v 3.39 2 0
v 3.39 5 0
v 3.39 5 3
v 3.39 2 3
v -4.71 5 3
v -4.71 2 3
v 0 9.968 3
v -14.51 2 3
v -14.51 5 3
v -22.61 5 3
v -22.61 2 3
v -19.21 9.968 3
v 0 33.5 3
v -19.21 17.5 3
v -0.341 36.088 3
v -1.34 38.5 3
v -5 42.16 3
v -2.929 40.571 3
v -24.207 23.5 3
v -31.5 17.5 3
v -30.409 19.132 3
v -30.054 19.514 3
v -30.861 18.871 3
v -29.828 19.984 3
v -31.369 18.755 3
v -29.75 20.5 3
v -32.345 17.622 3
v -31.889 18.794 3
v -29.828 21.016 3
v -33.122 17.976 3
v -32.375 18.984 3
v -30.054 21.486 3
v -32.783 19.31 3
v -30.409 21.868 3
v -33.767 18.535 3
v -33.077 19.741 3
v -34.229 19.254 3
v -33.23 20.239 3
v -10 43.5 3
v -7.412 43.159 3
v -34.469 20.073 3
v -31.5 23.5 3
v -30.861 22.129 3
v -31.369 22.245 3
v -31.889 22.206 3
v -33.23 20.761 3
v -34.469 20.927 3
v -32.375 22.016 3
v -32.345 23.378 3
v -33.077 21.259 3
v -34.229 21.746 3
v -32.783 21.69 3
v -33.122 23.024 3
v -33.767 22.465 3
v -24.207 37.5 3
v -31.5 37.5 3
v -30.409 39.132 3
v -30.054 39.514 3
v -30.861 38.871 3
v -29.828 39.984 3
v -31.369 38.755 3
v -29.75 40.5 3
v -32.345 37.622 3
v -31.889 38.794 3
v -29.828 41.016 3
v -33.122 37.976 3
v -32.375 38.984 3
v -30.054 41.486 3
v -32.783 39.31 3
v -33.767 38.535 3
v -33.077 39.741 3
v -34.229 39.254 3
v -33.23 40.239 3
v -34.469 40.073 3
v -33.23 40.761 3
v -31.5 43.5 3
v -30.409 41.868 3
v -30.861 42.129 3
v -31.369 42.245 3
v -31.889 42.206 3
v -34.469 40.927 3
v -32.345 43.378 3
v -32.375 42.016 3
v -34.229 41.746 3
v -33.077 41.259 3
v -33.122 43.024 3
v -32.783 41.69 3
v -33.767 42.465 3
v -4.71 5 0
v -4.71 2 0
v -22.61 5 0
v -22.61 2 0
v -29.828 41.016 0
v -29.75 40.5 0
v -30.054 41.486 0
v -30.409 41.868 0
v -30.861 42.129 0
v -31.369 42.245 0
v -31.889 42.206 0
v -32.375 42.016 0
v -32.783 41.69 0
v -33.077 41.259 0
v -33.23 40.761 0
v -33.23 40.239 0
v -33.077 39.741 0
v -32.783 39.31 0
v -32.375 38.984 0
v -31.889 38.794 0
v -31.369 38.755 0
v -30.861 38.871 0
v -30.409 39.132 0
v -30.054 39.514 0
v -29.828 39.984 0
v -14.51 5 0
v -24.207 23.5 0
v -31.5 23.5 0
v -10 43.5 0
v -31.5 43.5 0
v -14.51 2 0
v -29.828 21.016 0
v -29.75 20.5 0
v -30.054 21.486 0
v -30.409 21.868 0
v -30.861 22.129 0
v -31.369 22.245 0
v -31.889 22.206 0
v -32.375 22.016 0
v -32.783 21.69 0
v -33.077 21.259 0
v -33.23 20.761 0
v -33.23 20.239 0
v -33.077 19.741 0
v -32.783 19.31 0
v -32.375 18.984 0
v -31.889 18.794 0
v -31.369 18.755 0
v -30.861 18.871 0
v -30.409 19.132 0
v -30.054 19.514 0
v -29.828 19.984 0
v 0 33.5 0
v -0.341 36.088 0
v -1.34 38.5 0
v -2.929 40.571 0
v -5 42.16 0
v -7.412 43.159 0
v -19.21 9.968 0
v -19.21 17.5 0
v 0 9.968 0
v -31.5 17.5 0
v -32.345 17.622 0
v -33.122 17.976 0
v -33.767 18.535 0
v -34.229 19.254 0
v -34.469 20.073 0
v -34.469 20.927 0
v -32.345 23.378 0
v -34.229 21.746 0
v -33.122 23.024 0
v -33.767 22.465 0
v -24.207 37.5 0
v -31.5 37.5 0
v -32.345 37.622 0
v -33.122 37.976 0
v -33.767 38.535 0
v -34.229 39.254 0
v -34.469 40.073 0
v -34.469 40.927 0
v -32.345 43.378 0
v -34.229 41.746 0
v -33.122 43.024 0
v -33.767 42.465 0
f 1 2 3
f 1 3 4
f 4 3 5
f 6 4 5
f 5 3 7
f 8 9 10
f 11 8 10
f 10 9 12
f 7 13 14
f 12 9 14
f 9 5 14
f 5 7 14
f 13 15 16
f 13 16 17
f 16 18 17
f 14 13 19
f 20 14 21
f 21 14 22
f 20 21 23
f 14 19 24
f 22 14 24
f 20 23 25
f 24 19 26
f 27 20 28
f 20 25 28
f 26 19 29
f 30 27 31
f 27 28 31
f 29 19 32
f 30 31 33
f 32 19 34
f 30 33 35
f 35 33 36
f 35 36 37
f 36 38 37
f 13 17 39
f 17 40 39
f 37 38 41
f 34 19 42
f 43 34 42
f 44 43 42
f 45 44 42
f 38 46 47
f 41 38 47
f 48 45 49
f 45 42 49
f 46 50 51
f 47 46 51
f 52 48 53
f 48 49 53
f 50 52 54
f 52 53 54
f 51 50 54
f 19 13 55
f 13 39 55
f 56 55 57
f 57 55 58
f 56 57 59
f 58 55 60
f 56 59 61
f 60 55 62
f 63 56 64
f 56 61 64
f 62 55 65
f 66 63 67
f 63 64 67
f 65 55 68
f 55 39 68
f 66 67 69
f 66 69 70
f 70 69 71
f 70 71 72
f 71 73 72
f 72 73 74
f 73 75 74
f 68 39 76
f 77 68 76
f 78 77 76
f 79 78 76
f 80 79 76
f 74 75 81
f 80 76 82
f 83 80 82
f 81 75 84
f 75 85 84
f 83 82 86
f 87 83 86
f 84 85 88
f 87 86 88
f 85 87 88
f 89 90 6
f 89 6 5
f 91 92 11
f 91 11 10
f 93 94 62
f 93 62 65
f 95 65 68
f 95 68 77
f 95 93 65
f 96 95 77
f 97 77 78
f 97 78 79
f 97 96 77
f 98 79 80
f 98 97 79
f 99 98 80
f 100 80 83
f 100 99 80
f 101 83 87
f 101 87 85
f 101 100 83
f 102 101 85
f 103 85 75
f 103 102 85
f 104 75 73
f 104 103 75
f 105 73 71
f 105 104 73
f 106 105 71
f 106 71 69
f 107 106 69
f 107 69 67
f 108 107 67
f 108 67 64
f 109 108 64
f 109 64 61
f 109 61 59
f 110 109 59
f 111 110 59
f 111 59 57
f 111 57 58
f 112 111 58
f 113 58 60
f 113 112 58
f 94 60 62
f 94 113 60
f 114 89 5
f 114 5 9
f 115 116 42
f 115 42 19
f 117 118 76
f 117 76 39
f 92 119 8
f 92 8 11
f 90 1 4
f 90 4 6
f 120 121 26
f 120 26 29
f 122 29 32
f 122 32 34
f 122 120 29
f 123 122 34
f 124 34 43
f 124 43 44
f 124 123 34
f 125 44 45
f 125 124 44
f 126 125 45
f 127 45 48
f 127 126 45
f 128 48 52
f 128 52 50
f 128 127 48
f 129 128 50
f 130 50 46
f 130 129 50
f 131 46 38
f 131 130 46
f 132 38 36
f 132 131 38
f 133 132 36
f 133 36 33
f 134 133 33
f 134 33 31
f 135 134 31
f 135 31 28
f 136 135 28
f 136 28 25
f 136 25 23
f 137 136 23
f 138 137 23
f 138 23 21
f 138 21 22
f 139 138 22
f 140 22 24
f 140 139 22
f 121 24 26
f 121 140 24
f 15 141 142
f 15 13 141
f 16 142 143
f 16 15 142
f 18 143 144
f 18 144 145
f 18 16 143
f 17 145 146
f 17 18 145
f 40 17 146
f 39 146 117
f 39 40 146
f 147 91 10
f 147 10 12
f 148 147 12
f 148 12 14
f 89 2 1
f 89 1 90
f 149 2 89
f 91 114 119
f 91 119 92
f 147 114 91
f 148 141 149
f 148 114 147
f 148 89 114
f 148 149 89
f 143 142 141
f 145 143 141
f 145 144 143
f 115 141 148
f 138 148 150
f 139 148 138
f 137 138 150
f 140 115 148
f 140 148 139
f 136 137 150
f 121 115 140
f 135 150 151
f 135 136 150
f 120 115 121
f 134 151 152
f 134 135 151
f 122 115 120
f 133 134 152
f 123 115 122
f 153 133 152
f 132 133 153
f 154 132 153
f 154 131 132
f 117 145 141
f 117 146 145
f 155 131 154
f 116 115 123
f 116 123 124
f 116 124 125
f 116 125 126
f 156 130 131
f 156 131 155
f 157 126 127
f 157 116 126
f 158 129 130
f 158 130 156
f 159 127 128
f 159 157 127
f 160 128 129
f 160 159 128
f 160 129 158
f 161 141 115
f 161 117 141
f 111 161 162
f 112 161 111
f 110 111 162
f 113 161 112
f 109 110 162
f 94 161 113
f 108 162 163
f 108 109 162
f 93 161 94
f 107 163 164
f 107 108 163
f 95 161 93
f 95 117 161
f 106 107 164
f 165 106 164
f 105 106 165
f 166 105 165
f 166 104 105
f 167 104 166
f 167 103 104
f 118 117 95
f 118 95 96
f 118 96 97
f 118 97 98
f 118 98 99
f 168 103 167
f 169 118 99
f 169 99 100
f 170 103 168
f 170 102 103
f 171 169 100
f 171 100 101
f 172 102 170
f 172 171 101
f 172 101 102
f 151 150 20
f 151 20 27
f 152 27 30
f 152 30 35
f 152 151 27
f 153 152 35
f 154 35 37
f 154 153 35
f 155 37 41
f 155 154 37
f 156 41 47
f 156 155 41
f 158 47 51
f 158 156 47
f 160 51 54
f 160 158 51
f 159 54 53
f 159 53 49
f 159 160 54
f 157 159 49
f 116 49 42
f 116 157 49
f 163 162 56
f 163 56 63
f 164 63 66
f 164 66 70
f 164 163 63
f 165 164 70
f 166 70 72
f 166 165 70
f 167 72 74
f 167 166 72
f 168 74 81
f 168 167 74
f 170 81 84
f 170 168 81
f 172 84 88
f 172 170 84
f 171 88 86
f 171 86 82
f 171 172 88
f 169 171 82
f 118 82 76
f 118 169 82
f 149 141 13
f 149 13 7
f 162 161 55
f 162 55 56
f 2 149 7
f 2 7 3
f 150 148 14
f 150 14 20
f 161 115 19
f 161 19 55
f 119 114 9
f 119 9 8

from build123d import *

# Parameters (mm, degrees)
SKETCH1_R           = 1.75
BOSS_EXTRUDE1_DEPTH = 3
FILLET1_R           = 10


with BuildPart() as part:
    # Sketch1 → Boss-Extrude1 (new body)
    with BuildSketch(Plane.XY):
        with BuildLine():
            Line((0, 43.5), (0, 9.968037932))
            Line((0, 9.968037932), (3.389895868, 5))
            Line((3.389895868, 5), (3.389895868, 2))
            Line((3.389895868, 2), (-4.710104132, 2))
            Line((-4.710104132, 2), (-4.710104132, 5))
            Line((-4.710104132, 5), (-14.510104132, 5))
            Line((-14.510104132, 5), (-14.510104132, 2))
            Line((-14.510104132, 2), (-22.610104132, 2))
            Line((-22.610104132, 2), (-22.610104132, 5))
            Line((-22.610104132, 5), (-19.210104132, 9.968037932))
            Line((-19.210104132, 9.968037932), (-19.210104132, 17.5))
            Line((-19.210104132, 17.5), (-31.5, 17.5))
            ThreePointArc((-31.5, 17.5), (-34.5, 20.5), (-31.5, 23.5))
            Line((-31.5, 23.5), (-24.207476636, 23.5))
            Line((-24.207476636, 23.5), (-24.207476636, 37.5))
            Line((-24.207476636, 37.5), (-31.5, 37.5))
            ThreePointArc((-31.5, 37.5), (-34.5, 40.5), (-31.5, 43.5))
            Line((-31.5, 43.5), (0, 43.5))
        make_face()
        with Locations((-31.5, 40.5)):
            Circle(SKETCH1_R, mode=Mode.SUBTRACT)
        with Locations((-31.5, 20.5)):
            Circle(SKETCH1_R, mode=Mode.SUBTRACT)
    extrude(amount=BOSS_EXTRUDE1_DEPTH)

    # Fillet1
    fillet1_edges = [part.edges().sort_by_distance(p)[0] for p in [
        (0, 43.5, 1.5),
    ]]
    fillet(fillet1_edges, radius=FILLET1_R)


solid = part.part
